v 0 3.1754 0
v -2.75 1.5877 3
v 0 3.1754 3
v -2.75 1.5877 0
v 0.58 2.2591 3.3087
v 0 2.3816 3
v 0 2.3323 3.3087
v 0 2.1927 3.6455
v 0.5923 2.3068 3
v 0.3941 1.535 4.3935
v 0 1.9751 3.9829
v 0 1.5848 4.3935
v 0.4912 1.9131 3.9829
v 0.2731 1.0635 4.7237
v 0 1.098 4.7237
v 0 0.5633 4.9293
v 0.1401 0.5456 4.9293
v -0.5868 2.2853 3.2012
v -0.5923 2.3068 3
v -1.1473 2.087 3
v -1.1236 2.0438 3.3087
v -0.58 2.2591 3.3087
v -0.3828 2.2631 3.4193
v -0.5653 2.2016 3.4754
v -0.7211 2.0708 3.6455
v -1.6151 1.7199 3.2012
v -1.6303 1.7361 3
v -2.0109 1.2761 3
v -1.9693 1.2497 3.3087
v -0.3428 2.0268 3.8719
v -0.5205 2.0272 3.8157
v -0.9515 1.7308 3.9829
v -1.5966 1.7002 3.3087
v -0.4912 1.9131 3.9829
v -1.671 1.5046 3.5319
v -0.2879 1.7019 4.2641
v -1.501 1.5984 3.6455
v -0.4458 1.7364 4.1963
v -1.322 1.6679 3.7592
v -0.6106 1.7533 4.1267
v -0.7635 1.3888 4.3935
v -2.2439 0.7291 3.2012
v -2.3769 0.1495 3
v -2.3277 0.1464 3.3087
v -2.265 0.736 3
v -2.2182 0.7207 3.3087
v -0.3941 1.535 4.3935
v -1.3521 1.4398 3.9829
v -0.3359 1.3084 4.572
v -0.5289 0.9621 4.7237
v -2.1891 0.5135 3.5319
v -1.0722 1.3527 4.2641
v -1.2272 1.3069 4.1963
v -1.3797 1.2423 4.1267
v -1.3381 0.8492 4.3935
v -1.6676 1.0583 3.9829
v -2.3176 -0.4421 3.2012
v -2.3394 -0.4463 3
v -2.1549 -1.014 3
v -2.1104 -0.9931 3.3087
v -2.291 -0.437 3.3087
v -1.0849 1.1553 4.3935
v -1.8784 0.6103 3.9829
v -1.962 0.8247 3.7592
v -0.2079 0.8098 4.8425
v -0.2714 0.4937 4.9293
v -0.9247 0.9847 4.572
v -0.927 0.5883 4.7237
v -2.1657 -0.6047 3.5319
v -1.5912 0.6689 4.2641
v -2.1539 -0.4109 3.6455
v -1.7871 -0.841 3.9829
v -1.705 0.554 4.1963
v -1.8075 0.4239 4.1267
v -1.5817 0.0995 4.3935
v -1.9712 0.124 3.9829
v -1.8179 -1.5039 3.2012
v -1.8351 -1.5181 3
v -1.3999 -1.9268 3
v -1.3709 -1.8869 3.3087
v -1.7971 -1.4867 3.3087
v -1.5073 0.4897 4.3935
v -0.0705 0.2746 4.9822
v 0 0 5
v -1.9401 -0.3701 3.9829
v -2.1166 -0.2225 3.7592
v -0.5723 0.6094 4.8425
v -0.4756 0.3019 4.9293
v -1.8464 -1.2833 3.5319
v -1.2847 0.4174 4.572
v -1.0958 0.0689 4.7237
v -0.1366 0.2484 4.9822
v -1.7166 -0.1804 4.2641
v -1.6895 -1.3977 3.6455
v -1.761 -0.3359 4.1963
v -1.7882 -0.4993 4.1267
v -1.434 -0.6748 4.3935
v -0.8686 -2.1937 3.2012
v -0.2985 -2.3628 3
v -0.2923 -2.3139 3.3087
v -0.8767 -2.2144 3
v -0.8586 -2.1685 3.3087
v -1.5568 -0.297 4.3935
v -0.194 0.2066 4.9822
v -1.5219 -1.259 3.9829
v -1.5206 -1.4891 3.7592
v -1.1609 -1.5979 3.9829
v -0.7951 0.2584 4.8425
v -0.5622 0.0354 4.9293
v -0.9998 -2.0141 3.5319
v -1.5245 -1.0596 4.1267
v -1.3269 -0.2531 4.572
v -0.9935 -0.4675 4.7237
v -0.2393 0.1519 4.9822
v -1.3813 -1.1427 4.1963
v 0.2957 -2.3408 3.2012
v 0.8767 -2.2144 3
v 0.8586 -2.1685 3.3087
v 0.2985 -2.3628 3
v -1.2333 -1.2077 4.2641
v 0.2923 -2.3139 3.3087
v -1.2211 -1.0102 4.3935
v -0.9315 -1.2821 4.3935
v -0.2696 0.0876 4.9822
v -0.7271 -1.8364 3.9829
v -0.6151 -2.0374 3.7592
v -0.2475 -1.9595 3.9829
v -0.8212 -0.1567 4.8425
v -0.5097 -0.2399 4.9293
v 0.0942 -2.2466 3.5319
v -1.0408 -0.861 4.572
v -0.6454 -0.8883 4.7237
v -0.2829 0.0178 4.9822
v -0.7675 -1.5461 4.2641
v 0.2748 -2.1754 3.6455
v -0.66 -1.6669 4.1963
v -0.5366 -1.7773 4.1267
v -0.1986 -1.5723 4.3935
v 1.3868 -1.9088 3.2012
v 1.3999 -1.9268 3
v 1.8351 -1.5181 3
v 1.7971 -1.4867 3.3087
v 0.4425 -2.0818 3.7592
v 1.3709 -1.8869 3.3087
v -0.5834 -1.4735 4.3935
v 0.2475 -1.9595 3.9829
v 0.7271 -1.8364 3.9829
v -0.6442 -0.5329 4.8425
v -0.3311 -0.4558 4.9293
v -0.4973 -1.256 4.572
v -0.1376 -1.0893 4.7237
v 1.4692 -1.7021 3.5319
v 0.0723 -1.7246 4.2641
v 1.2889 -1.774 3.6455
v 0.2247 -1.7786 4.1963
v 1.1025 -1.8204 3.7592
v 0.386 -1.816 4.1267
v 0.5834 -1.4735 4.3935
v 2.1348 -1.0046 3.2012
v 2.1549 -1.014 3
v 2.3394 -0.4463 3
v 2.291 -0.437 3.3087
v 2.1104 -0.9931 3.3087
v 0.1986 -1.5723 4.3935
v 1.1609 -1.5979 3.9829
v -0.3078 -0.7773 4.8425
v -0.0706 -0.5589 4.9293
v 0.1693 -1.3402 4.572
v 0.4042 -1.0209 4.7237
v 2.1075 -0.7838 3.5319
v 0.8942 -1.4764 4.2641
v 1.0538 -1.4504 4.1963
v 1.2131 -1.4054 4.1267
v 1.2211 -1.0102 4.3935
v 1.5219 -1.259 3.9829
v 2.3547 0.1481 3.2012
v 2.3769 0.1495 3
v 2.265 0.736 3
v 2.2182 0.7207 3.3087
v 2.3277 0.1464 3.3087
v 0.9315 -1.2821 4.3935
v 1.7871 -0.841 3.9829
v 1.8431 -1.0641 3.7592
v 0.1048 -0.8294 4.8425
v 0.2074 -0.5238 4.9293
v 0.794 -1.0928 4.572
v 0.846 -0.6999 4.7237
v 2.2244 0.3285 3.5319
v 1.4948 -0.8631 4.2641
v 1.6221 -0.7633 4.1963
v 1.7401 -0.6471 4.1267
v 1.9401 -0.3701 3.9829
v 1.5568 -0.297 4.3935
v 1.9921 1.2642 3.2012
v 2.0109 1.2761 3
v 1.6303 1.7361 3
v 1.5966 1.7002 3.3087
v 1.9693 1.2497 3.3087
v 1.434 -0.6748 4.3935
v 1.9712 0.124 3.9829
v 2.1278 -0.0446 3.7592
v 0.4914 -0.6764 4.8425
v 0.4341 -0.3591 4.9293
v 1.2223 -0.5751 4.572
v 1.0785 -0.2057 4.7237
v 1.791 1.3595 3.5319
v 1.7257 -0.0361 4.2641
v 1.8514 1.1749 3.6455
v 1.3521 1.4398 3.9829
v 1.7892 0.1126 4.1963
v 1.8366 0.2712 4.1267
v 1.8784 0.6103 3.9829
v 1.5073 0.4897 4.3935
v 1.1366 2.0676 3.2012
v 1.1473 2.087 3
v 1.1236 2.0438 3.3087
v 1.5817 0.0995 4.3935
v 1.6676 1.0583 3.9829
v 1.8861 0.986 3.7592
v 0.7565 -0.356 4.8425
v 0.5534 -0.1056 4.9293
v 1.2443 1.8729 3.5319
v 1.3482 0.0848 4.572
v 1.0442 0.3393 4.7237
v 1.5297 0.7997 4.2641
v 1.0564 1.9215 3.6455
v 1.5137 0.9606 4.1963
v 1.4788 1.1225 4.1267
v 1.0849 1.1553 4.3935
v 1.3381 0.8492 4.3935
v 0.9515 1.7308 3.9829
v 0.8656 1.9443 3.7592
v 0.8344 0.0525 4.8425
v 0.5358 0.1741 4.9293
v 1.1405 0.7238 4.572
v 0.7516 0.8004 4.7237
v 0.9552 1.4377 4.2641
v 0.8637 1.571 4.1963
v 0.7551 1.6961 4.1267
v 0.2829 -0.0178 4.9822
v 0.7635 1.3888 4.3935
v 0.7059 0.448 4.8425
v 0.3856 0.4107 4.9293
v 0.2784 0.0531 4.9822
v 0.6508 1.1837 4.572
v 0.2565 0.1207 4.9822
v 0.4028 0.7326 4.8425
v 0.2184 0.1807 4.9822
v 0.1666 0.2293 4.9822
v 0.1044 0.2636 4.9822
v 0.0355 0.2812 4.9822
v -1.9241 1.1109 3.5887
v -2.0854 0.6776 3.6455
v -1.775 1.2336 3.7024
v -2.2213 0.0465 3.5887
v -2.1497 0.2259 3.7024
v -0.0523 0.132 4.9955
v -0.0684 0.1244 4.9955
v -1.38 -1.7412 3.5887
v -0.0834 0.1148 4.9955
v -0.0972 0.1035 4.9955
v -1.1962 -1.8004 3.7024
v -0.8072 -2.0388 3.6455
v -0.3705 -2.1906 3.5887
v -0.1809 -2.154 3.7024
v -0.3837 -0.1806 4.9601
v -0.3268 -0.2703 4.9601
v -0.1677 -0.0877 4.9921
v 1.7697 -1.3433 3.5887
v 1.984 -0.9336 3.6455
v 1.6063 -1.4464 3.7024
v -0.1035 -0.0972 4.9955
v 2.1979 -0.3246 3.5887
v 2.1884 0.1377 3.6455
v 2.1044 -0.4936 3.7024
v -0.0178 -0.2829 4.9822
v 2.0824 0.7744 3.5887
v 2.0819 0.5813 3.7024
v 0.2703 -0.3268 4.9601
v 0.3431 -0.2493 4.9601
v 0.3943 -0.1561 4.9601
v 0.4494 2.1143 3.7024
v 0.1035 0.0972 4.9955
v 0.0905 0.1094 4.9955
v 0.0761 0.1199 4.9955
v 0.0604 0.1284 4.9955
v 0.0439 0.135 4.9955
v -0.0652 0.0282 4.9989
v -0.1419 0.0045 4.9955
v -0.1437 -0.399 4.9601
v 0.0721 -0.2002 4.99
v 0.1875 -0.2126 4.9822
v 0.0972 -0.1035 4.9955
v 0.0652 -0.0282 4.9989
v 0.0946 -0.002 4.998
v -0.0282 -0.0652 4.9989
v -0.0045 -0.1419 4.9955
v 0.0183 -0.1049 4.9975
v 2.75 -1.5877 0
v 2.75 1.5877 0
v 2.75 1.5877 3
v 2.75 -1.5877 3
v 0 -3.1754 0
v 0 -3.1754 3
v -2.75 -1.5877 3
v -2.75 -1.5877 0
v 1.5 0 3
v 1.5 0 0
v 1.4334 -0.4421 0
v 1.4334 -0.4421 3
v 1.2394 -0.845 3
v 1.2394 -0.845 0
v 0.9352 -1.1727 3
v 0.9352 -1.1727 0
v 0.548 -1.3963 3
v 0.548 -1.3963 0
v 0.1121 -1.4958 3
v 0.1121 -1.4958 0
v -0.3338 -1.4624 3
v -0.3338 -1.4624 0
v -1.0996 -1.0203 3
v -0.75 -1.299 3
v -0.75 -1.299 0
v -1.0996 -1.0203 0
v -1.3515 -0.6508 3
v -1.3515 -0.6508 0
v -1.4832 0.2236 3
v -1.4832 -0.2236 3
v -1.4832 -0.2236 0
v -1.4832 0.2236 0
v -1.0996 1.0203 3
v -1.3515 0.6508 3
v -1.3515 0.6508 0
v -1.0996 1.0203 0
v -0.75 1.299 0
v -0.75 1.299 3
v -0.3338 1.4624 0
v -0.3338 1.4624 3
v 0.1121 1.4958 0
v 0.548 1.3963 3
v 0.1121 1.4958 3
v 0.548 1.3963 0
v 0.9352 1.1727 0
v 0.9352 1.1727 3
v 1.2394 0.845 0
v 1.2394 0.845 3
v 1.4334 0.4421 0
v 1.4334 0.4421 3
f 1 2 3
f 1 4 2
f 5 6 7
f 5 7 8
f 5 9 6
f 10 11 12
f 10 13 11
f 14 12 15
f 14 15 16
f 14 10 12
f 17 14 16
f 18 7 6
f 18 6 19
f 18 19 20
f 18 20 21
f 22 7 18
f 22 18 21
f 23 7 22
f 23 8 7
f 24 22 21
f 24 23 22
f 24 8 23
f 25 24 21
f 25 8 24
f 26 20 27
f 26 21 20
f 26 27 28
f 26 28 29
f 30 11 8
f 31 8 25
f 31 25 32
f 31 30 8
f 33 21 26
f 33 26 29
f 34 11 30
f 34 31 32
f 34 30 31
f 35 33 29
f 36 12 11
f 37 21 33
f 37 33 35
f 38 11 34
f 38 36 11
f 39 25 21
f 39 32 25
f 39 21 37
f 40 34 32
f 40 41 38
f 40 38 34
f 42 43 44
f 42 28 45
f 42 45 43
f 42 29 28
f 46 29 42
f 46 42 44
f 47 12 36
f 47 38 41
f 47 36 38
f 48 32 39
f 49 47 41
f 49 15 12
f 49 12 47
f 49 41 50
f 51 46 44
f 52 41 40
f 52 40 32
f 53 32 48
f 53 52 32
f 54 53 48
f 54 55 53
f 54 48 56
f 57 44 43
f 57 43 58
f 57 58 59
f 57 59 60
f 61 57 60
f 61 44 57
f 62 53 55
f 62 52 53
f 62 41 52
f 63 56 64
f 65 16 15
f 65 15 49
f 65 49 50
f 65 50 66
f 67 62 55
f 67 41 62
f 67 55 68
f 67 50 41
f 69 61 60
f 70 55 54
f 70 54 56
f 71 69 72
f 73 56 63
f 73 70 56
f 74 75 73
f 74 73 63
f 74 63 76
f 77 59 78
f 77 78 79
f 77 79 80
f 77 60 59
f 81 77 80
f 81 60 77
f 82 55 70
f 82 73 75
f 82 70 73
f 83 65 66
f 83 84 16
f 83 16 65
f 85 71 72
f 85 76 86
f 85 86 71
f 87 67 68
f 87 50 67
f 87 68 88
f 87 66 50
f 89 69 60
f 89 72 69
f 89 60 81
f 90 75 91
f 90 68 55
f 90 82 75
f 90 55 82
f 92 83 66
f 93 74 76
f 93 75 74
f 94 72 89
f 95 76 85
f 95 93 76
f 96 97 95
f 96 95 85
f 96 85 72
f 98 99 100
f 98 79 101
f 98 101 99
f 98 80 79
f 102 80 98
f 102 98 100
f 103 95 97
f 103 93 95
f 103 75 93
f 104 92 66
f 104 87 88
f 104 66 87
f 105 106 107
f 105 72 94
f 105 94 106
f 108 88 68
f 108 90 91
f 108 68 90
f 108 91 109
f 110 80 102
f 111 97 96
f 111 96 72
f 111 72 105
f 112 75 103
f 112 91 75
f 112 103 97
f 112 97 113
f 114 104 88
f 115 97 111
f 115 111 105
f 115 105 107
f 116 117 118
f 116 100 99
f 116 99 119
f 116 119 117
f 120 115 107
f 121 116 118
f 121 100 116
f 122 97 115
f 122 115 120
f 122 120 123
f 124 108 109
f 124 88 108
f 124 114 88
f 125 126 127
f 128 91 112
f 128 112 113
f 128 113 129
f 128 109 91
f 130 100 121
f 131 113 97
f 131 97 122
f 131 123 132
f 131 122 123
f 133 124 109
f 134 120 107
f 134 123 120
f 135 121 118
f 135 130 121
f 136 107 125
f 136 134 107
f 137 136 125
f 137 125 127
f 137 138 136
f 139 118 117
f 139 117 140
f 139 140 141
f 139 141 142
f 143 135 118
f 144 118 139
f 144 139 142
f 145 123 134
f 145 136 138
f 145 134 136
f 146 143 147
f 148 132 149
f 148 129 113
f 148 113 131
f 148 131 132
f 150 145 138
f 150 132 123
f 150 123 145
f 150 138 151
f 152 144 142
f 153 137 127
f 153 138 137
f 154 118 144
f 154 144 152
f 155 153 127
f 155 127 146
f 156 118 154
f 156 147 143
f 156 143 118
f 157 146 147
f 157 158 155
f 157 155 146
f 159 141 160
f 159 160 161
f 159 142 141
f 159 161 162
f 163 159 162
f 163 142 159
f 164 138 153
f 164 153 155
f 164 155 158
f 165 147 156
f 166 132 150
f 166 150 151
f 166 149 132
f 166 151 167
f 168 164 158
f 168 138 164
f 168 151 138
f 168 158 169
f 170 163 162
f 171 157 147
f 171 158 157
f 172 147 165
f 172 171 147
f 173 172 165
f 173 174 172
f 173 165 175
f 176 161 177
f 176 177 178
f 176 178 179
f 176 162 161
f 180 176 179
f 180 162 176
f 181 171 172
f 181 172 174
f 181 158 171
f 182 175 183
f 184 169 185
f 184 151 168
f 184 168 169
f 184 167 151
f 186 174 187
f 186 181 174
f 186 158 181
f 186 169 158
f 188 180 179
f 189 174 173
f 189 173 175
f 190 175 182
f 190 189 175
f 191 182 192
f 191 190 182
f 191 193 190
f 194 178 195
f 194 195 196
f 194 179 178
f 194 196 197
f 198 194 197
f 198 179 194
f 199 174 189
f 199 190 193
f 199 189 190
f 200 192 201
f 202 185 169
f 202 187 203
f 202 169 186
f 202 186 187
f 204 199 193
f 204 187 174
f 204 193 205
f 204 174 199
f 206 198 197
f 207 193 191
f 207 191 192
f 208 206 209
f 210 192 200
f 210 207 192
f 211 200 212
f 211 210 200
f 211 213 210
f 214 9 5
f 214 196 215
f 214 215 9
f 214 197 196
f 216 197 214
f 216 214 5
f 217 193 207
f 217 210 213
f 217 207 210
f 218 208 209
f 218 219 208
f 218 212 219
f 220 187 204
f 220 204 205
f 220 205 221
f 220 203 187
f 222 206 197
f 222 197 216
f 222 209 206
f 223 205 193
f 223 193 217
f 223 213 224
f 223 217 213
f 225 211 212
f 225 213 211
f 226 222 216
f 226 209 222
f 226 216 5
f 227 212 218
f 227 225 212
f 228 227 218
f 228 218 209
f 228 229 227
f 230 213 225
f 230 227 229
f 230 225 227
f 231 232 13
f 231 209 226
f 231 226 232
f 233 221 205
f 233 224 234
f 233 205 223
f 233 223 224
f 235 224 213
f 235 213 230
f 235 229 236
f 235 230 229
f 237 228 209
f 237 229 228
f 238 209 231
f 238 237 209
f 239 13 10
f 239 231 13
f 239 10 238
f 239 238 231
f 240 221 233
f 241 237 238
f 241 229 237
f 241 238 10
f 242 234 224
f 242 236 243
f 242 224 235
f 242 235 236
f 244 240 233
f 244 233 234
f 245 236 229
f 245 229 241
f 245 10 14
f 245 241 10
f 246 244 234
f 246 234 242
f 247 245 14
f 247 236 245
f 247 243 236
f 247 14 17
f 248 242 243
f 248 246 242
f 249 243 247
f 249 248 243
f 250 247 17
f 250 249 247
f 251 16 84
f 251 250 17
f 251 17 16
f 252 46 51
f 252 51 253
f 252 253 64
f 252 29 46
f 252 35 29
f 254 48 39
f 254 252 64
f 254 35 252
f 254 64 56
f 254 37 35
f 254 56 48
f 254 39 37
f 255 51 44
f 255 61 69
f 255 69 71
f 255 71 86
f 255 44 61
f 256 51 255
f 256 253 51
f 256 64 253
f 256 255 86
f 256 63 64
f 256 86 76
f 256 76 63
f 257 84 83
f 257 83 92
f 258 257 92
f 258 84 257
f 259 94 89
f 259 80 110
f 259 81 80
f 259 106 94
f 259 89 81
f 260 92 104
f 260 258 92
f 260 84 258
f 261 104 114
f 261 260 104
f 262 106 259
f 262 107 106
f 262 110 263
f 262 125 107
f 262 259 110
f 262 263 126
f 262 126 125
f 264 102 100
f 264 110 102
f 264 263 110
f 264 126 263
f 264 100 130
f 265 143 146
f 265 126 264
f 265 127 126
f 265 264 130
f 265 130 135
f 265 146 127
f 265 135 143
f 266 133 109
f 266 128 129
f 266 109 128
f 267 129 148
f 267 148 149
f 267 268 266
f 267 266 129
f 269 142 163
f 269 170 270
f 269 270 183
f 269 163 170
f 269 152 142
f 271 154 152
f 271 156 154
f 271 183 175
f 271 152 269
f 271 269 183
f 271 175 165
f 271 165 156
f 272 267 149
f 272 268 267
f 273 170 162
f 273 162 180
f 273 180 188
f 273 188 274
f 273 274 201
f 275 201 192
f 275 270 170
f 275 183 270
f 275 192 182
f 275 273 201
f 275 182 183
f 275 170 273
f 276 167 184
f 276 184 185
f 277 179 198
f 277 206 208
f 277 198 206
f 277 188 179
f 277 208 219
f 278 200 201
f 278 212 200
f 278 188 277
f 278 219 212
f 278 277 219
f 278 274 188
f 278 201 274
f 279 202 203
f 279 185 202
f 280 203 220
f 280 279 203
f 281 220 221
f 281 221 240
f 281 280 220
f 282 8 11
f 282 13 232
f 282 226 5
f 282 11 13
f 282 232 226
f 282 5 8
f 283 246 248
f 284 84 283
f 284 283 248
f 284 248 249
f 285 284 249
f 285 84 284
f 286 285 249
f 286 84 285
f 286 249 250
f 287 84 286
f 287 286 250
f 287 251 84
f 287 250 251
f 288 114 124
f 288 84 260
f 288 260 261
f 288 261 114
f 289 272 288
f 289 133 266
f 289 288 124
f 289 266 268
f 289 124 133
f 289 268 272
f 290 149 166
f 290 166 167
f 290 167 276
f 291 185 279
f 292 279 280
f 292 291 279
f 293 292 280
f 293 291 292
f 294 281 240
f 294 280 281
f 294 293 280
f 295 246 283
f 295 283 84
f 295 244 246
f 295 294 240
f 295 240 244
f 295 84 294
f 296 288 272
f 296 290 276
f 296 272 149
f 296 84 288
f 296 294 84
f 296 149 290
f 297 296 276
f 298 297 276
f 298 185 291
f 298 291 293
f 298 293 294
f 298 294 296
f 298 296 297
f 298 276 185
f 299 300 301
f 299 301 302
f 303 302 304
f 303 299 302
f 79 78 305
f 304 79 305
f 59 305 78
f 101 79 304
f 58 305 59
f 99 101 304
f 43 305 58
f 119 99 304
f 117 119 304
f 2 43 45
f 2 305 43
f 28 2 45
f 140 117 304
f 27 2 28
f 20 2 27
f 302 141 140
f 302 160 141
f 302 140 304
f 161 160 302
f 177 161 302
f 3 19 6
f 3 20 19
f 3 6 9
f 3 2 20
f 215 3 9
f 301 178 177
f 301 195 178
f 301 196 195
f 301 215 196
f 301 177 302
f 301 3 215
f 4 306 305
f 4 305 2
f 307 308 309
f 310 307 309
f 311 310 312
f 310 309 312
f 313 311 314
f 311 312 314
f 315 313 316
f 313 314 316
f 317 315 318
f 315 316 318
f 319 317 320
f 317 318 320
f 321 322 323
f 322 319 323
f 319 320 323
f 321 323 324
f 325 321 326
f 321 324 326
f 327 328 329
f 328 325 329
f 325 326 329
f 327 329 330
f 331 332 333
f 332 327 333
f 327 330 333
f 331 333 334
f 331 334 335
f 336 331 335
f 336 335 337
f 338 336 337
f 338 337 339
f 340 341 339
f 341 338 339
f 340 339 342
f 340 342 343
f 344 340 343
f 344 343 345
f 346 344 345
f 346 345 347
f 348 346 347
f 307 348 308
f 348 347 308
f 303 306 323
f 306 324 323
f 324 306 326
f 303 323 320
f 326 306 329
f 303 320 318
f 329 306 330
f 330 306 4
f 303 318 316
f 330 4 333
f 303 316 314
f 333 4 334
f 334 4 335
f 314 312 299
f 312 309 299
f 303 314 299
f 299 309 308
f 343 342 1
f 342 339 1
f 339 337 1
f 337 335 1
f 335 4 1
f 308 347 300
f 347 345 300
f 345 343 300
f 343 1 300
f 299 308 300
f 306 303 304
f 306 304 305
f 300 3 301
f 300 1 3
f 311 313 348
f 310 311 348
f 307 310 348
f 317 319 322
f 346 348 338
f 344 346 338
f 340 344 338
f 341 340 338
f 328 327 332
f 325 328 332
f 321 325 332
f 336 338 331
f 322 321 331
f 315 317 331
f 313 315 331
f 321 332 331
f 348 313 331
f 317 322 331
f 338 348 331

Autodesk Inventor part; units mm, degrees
ref_plane "YZ Plane" through (0, 0, 0) normal (1, 0, 0) x (0, 1, 0)
ref_plane "XZ Plane" through (0, 0, 0) normal (0, 1, 0) x (-1, 0, 0)
ref_plane "XY Plane" through (0, 0, 0) normal (0, 0, 1) x (1, 0, 0)
sketch "Sketch1" plane through (0, 0, 0) normal (0, 0, 1) x (1, 0, 0)
  line L0 (2.75, 1.5877) -> (2.75, -1.5877)
  line L1 (2.75, -1.5877) -> (0, -3.1754)
  line L2 (0, -3.1754) -> (-2.75, -1.5877)
  line L3 (-2.75, -1.5877) -> (-2.75, 1.5877)
  line L4 (-2.75, 1.5877) -> (0, 3.1754)
  line L5 (0, 3.1754) -> (2.75, 1.5877)
  circle A0 centre (0, 0) radius 1.5
  dimension "d0" = 5.5
  dimension "d1" = 3
extrude "Extrusion1" add sketch "Sketch1" along normal blind 3
sketch "Sketch2" plane through (0, 0, 0) normal (1, 0, 0) x (0, 1, 0)
  line L0 (2.3816, 3) -> (2.3816, 4.1867) construction
  line L1 (2.3816, 4.1867) -> (0, 6.751) construction
  line L2 (0, 6.751) -> (-2.3816, 4.1867) construction
  line L3 (-2.3816, 4.1867) -> (-2.3816, 3) construction
  spline S0 degree 4 poles (2.3816, 3) (2.3816, 4.1867) (0, 6.751) (-2.3816, 4.1867) (-2.3816, 3) knots 1 1 1 1 1 2 2 2 2 2
  line L4 (0.553, 5) -> (-1.6263, 5)
  line L5 (-3.1754, 0) -> (-1.5877, 0) projected
  line L6 (-1.5877, 3) -> (1.5877, 3) projected
  line L7 (-3.1754, 3) -> (-1.5877, 3) projected
  line L8 (1.5877, 3) -> (3.1754, 3) projected
  line L9 (2.3816, 3) -> (-2.3816, 3)
  line L10 (0, 3) -> (0, 6.751)
  line L11 (1.5877, 3) -> (-1.5877, 3) projected
  point P0 (0, 0)
  point P1 (0, 5)
  dimension "d4" = 5
revolve "Revolution1" add sketch "Sketch2" angle 360 about axis through (0, 0, 3) along (0, 0, 1) contours L8 L6 L10 S0
thread "Thread1" size "M3x0.5" class "6H" standard "ANSI Metric M Profile" full length
properties part number "M3 Acorn Nut"
